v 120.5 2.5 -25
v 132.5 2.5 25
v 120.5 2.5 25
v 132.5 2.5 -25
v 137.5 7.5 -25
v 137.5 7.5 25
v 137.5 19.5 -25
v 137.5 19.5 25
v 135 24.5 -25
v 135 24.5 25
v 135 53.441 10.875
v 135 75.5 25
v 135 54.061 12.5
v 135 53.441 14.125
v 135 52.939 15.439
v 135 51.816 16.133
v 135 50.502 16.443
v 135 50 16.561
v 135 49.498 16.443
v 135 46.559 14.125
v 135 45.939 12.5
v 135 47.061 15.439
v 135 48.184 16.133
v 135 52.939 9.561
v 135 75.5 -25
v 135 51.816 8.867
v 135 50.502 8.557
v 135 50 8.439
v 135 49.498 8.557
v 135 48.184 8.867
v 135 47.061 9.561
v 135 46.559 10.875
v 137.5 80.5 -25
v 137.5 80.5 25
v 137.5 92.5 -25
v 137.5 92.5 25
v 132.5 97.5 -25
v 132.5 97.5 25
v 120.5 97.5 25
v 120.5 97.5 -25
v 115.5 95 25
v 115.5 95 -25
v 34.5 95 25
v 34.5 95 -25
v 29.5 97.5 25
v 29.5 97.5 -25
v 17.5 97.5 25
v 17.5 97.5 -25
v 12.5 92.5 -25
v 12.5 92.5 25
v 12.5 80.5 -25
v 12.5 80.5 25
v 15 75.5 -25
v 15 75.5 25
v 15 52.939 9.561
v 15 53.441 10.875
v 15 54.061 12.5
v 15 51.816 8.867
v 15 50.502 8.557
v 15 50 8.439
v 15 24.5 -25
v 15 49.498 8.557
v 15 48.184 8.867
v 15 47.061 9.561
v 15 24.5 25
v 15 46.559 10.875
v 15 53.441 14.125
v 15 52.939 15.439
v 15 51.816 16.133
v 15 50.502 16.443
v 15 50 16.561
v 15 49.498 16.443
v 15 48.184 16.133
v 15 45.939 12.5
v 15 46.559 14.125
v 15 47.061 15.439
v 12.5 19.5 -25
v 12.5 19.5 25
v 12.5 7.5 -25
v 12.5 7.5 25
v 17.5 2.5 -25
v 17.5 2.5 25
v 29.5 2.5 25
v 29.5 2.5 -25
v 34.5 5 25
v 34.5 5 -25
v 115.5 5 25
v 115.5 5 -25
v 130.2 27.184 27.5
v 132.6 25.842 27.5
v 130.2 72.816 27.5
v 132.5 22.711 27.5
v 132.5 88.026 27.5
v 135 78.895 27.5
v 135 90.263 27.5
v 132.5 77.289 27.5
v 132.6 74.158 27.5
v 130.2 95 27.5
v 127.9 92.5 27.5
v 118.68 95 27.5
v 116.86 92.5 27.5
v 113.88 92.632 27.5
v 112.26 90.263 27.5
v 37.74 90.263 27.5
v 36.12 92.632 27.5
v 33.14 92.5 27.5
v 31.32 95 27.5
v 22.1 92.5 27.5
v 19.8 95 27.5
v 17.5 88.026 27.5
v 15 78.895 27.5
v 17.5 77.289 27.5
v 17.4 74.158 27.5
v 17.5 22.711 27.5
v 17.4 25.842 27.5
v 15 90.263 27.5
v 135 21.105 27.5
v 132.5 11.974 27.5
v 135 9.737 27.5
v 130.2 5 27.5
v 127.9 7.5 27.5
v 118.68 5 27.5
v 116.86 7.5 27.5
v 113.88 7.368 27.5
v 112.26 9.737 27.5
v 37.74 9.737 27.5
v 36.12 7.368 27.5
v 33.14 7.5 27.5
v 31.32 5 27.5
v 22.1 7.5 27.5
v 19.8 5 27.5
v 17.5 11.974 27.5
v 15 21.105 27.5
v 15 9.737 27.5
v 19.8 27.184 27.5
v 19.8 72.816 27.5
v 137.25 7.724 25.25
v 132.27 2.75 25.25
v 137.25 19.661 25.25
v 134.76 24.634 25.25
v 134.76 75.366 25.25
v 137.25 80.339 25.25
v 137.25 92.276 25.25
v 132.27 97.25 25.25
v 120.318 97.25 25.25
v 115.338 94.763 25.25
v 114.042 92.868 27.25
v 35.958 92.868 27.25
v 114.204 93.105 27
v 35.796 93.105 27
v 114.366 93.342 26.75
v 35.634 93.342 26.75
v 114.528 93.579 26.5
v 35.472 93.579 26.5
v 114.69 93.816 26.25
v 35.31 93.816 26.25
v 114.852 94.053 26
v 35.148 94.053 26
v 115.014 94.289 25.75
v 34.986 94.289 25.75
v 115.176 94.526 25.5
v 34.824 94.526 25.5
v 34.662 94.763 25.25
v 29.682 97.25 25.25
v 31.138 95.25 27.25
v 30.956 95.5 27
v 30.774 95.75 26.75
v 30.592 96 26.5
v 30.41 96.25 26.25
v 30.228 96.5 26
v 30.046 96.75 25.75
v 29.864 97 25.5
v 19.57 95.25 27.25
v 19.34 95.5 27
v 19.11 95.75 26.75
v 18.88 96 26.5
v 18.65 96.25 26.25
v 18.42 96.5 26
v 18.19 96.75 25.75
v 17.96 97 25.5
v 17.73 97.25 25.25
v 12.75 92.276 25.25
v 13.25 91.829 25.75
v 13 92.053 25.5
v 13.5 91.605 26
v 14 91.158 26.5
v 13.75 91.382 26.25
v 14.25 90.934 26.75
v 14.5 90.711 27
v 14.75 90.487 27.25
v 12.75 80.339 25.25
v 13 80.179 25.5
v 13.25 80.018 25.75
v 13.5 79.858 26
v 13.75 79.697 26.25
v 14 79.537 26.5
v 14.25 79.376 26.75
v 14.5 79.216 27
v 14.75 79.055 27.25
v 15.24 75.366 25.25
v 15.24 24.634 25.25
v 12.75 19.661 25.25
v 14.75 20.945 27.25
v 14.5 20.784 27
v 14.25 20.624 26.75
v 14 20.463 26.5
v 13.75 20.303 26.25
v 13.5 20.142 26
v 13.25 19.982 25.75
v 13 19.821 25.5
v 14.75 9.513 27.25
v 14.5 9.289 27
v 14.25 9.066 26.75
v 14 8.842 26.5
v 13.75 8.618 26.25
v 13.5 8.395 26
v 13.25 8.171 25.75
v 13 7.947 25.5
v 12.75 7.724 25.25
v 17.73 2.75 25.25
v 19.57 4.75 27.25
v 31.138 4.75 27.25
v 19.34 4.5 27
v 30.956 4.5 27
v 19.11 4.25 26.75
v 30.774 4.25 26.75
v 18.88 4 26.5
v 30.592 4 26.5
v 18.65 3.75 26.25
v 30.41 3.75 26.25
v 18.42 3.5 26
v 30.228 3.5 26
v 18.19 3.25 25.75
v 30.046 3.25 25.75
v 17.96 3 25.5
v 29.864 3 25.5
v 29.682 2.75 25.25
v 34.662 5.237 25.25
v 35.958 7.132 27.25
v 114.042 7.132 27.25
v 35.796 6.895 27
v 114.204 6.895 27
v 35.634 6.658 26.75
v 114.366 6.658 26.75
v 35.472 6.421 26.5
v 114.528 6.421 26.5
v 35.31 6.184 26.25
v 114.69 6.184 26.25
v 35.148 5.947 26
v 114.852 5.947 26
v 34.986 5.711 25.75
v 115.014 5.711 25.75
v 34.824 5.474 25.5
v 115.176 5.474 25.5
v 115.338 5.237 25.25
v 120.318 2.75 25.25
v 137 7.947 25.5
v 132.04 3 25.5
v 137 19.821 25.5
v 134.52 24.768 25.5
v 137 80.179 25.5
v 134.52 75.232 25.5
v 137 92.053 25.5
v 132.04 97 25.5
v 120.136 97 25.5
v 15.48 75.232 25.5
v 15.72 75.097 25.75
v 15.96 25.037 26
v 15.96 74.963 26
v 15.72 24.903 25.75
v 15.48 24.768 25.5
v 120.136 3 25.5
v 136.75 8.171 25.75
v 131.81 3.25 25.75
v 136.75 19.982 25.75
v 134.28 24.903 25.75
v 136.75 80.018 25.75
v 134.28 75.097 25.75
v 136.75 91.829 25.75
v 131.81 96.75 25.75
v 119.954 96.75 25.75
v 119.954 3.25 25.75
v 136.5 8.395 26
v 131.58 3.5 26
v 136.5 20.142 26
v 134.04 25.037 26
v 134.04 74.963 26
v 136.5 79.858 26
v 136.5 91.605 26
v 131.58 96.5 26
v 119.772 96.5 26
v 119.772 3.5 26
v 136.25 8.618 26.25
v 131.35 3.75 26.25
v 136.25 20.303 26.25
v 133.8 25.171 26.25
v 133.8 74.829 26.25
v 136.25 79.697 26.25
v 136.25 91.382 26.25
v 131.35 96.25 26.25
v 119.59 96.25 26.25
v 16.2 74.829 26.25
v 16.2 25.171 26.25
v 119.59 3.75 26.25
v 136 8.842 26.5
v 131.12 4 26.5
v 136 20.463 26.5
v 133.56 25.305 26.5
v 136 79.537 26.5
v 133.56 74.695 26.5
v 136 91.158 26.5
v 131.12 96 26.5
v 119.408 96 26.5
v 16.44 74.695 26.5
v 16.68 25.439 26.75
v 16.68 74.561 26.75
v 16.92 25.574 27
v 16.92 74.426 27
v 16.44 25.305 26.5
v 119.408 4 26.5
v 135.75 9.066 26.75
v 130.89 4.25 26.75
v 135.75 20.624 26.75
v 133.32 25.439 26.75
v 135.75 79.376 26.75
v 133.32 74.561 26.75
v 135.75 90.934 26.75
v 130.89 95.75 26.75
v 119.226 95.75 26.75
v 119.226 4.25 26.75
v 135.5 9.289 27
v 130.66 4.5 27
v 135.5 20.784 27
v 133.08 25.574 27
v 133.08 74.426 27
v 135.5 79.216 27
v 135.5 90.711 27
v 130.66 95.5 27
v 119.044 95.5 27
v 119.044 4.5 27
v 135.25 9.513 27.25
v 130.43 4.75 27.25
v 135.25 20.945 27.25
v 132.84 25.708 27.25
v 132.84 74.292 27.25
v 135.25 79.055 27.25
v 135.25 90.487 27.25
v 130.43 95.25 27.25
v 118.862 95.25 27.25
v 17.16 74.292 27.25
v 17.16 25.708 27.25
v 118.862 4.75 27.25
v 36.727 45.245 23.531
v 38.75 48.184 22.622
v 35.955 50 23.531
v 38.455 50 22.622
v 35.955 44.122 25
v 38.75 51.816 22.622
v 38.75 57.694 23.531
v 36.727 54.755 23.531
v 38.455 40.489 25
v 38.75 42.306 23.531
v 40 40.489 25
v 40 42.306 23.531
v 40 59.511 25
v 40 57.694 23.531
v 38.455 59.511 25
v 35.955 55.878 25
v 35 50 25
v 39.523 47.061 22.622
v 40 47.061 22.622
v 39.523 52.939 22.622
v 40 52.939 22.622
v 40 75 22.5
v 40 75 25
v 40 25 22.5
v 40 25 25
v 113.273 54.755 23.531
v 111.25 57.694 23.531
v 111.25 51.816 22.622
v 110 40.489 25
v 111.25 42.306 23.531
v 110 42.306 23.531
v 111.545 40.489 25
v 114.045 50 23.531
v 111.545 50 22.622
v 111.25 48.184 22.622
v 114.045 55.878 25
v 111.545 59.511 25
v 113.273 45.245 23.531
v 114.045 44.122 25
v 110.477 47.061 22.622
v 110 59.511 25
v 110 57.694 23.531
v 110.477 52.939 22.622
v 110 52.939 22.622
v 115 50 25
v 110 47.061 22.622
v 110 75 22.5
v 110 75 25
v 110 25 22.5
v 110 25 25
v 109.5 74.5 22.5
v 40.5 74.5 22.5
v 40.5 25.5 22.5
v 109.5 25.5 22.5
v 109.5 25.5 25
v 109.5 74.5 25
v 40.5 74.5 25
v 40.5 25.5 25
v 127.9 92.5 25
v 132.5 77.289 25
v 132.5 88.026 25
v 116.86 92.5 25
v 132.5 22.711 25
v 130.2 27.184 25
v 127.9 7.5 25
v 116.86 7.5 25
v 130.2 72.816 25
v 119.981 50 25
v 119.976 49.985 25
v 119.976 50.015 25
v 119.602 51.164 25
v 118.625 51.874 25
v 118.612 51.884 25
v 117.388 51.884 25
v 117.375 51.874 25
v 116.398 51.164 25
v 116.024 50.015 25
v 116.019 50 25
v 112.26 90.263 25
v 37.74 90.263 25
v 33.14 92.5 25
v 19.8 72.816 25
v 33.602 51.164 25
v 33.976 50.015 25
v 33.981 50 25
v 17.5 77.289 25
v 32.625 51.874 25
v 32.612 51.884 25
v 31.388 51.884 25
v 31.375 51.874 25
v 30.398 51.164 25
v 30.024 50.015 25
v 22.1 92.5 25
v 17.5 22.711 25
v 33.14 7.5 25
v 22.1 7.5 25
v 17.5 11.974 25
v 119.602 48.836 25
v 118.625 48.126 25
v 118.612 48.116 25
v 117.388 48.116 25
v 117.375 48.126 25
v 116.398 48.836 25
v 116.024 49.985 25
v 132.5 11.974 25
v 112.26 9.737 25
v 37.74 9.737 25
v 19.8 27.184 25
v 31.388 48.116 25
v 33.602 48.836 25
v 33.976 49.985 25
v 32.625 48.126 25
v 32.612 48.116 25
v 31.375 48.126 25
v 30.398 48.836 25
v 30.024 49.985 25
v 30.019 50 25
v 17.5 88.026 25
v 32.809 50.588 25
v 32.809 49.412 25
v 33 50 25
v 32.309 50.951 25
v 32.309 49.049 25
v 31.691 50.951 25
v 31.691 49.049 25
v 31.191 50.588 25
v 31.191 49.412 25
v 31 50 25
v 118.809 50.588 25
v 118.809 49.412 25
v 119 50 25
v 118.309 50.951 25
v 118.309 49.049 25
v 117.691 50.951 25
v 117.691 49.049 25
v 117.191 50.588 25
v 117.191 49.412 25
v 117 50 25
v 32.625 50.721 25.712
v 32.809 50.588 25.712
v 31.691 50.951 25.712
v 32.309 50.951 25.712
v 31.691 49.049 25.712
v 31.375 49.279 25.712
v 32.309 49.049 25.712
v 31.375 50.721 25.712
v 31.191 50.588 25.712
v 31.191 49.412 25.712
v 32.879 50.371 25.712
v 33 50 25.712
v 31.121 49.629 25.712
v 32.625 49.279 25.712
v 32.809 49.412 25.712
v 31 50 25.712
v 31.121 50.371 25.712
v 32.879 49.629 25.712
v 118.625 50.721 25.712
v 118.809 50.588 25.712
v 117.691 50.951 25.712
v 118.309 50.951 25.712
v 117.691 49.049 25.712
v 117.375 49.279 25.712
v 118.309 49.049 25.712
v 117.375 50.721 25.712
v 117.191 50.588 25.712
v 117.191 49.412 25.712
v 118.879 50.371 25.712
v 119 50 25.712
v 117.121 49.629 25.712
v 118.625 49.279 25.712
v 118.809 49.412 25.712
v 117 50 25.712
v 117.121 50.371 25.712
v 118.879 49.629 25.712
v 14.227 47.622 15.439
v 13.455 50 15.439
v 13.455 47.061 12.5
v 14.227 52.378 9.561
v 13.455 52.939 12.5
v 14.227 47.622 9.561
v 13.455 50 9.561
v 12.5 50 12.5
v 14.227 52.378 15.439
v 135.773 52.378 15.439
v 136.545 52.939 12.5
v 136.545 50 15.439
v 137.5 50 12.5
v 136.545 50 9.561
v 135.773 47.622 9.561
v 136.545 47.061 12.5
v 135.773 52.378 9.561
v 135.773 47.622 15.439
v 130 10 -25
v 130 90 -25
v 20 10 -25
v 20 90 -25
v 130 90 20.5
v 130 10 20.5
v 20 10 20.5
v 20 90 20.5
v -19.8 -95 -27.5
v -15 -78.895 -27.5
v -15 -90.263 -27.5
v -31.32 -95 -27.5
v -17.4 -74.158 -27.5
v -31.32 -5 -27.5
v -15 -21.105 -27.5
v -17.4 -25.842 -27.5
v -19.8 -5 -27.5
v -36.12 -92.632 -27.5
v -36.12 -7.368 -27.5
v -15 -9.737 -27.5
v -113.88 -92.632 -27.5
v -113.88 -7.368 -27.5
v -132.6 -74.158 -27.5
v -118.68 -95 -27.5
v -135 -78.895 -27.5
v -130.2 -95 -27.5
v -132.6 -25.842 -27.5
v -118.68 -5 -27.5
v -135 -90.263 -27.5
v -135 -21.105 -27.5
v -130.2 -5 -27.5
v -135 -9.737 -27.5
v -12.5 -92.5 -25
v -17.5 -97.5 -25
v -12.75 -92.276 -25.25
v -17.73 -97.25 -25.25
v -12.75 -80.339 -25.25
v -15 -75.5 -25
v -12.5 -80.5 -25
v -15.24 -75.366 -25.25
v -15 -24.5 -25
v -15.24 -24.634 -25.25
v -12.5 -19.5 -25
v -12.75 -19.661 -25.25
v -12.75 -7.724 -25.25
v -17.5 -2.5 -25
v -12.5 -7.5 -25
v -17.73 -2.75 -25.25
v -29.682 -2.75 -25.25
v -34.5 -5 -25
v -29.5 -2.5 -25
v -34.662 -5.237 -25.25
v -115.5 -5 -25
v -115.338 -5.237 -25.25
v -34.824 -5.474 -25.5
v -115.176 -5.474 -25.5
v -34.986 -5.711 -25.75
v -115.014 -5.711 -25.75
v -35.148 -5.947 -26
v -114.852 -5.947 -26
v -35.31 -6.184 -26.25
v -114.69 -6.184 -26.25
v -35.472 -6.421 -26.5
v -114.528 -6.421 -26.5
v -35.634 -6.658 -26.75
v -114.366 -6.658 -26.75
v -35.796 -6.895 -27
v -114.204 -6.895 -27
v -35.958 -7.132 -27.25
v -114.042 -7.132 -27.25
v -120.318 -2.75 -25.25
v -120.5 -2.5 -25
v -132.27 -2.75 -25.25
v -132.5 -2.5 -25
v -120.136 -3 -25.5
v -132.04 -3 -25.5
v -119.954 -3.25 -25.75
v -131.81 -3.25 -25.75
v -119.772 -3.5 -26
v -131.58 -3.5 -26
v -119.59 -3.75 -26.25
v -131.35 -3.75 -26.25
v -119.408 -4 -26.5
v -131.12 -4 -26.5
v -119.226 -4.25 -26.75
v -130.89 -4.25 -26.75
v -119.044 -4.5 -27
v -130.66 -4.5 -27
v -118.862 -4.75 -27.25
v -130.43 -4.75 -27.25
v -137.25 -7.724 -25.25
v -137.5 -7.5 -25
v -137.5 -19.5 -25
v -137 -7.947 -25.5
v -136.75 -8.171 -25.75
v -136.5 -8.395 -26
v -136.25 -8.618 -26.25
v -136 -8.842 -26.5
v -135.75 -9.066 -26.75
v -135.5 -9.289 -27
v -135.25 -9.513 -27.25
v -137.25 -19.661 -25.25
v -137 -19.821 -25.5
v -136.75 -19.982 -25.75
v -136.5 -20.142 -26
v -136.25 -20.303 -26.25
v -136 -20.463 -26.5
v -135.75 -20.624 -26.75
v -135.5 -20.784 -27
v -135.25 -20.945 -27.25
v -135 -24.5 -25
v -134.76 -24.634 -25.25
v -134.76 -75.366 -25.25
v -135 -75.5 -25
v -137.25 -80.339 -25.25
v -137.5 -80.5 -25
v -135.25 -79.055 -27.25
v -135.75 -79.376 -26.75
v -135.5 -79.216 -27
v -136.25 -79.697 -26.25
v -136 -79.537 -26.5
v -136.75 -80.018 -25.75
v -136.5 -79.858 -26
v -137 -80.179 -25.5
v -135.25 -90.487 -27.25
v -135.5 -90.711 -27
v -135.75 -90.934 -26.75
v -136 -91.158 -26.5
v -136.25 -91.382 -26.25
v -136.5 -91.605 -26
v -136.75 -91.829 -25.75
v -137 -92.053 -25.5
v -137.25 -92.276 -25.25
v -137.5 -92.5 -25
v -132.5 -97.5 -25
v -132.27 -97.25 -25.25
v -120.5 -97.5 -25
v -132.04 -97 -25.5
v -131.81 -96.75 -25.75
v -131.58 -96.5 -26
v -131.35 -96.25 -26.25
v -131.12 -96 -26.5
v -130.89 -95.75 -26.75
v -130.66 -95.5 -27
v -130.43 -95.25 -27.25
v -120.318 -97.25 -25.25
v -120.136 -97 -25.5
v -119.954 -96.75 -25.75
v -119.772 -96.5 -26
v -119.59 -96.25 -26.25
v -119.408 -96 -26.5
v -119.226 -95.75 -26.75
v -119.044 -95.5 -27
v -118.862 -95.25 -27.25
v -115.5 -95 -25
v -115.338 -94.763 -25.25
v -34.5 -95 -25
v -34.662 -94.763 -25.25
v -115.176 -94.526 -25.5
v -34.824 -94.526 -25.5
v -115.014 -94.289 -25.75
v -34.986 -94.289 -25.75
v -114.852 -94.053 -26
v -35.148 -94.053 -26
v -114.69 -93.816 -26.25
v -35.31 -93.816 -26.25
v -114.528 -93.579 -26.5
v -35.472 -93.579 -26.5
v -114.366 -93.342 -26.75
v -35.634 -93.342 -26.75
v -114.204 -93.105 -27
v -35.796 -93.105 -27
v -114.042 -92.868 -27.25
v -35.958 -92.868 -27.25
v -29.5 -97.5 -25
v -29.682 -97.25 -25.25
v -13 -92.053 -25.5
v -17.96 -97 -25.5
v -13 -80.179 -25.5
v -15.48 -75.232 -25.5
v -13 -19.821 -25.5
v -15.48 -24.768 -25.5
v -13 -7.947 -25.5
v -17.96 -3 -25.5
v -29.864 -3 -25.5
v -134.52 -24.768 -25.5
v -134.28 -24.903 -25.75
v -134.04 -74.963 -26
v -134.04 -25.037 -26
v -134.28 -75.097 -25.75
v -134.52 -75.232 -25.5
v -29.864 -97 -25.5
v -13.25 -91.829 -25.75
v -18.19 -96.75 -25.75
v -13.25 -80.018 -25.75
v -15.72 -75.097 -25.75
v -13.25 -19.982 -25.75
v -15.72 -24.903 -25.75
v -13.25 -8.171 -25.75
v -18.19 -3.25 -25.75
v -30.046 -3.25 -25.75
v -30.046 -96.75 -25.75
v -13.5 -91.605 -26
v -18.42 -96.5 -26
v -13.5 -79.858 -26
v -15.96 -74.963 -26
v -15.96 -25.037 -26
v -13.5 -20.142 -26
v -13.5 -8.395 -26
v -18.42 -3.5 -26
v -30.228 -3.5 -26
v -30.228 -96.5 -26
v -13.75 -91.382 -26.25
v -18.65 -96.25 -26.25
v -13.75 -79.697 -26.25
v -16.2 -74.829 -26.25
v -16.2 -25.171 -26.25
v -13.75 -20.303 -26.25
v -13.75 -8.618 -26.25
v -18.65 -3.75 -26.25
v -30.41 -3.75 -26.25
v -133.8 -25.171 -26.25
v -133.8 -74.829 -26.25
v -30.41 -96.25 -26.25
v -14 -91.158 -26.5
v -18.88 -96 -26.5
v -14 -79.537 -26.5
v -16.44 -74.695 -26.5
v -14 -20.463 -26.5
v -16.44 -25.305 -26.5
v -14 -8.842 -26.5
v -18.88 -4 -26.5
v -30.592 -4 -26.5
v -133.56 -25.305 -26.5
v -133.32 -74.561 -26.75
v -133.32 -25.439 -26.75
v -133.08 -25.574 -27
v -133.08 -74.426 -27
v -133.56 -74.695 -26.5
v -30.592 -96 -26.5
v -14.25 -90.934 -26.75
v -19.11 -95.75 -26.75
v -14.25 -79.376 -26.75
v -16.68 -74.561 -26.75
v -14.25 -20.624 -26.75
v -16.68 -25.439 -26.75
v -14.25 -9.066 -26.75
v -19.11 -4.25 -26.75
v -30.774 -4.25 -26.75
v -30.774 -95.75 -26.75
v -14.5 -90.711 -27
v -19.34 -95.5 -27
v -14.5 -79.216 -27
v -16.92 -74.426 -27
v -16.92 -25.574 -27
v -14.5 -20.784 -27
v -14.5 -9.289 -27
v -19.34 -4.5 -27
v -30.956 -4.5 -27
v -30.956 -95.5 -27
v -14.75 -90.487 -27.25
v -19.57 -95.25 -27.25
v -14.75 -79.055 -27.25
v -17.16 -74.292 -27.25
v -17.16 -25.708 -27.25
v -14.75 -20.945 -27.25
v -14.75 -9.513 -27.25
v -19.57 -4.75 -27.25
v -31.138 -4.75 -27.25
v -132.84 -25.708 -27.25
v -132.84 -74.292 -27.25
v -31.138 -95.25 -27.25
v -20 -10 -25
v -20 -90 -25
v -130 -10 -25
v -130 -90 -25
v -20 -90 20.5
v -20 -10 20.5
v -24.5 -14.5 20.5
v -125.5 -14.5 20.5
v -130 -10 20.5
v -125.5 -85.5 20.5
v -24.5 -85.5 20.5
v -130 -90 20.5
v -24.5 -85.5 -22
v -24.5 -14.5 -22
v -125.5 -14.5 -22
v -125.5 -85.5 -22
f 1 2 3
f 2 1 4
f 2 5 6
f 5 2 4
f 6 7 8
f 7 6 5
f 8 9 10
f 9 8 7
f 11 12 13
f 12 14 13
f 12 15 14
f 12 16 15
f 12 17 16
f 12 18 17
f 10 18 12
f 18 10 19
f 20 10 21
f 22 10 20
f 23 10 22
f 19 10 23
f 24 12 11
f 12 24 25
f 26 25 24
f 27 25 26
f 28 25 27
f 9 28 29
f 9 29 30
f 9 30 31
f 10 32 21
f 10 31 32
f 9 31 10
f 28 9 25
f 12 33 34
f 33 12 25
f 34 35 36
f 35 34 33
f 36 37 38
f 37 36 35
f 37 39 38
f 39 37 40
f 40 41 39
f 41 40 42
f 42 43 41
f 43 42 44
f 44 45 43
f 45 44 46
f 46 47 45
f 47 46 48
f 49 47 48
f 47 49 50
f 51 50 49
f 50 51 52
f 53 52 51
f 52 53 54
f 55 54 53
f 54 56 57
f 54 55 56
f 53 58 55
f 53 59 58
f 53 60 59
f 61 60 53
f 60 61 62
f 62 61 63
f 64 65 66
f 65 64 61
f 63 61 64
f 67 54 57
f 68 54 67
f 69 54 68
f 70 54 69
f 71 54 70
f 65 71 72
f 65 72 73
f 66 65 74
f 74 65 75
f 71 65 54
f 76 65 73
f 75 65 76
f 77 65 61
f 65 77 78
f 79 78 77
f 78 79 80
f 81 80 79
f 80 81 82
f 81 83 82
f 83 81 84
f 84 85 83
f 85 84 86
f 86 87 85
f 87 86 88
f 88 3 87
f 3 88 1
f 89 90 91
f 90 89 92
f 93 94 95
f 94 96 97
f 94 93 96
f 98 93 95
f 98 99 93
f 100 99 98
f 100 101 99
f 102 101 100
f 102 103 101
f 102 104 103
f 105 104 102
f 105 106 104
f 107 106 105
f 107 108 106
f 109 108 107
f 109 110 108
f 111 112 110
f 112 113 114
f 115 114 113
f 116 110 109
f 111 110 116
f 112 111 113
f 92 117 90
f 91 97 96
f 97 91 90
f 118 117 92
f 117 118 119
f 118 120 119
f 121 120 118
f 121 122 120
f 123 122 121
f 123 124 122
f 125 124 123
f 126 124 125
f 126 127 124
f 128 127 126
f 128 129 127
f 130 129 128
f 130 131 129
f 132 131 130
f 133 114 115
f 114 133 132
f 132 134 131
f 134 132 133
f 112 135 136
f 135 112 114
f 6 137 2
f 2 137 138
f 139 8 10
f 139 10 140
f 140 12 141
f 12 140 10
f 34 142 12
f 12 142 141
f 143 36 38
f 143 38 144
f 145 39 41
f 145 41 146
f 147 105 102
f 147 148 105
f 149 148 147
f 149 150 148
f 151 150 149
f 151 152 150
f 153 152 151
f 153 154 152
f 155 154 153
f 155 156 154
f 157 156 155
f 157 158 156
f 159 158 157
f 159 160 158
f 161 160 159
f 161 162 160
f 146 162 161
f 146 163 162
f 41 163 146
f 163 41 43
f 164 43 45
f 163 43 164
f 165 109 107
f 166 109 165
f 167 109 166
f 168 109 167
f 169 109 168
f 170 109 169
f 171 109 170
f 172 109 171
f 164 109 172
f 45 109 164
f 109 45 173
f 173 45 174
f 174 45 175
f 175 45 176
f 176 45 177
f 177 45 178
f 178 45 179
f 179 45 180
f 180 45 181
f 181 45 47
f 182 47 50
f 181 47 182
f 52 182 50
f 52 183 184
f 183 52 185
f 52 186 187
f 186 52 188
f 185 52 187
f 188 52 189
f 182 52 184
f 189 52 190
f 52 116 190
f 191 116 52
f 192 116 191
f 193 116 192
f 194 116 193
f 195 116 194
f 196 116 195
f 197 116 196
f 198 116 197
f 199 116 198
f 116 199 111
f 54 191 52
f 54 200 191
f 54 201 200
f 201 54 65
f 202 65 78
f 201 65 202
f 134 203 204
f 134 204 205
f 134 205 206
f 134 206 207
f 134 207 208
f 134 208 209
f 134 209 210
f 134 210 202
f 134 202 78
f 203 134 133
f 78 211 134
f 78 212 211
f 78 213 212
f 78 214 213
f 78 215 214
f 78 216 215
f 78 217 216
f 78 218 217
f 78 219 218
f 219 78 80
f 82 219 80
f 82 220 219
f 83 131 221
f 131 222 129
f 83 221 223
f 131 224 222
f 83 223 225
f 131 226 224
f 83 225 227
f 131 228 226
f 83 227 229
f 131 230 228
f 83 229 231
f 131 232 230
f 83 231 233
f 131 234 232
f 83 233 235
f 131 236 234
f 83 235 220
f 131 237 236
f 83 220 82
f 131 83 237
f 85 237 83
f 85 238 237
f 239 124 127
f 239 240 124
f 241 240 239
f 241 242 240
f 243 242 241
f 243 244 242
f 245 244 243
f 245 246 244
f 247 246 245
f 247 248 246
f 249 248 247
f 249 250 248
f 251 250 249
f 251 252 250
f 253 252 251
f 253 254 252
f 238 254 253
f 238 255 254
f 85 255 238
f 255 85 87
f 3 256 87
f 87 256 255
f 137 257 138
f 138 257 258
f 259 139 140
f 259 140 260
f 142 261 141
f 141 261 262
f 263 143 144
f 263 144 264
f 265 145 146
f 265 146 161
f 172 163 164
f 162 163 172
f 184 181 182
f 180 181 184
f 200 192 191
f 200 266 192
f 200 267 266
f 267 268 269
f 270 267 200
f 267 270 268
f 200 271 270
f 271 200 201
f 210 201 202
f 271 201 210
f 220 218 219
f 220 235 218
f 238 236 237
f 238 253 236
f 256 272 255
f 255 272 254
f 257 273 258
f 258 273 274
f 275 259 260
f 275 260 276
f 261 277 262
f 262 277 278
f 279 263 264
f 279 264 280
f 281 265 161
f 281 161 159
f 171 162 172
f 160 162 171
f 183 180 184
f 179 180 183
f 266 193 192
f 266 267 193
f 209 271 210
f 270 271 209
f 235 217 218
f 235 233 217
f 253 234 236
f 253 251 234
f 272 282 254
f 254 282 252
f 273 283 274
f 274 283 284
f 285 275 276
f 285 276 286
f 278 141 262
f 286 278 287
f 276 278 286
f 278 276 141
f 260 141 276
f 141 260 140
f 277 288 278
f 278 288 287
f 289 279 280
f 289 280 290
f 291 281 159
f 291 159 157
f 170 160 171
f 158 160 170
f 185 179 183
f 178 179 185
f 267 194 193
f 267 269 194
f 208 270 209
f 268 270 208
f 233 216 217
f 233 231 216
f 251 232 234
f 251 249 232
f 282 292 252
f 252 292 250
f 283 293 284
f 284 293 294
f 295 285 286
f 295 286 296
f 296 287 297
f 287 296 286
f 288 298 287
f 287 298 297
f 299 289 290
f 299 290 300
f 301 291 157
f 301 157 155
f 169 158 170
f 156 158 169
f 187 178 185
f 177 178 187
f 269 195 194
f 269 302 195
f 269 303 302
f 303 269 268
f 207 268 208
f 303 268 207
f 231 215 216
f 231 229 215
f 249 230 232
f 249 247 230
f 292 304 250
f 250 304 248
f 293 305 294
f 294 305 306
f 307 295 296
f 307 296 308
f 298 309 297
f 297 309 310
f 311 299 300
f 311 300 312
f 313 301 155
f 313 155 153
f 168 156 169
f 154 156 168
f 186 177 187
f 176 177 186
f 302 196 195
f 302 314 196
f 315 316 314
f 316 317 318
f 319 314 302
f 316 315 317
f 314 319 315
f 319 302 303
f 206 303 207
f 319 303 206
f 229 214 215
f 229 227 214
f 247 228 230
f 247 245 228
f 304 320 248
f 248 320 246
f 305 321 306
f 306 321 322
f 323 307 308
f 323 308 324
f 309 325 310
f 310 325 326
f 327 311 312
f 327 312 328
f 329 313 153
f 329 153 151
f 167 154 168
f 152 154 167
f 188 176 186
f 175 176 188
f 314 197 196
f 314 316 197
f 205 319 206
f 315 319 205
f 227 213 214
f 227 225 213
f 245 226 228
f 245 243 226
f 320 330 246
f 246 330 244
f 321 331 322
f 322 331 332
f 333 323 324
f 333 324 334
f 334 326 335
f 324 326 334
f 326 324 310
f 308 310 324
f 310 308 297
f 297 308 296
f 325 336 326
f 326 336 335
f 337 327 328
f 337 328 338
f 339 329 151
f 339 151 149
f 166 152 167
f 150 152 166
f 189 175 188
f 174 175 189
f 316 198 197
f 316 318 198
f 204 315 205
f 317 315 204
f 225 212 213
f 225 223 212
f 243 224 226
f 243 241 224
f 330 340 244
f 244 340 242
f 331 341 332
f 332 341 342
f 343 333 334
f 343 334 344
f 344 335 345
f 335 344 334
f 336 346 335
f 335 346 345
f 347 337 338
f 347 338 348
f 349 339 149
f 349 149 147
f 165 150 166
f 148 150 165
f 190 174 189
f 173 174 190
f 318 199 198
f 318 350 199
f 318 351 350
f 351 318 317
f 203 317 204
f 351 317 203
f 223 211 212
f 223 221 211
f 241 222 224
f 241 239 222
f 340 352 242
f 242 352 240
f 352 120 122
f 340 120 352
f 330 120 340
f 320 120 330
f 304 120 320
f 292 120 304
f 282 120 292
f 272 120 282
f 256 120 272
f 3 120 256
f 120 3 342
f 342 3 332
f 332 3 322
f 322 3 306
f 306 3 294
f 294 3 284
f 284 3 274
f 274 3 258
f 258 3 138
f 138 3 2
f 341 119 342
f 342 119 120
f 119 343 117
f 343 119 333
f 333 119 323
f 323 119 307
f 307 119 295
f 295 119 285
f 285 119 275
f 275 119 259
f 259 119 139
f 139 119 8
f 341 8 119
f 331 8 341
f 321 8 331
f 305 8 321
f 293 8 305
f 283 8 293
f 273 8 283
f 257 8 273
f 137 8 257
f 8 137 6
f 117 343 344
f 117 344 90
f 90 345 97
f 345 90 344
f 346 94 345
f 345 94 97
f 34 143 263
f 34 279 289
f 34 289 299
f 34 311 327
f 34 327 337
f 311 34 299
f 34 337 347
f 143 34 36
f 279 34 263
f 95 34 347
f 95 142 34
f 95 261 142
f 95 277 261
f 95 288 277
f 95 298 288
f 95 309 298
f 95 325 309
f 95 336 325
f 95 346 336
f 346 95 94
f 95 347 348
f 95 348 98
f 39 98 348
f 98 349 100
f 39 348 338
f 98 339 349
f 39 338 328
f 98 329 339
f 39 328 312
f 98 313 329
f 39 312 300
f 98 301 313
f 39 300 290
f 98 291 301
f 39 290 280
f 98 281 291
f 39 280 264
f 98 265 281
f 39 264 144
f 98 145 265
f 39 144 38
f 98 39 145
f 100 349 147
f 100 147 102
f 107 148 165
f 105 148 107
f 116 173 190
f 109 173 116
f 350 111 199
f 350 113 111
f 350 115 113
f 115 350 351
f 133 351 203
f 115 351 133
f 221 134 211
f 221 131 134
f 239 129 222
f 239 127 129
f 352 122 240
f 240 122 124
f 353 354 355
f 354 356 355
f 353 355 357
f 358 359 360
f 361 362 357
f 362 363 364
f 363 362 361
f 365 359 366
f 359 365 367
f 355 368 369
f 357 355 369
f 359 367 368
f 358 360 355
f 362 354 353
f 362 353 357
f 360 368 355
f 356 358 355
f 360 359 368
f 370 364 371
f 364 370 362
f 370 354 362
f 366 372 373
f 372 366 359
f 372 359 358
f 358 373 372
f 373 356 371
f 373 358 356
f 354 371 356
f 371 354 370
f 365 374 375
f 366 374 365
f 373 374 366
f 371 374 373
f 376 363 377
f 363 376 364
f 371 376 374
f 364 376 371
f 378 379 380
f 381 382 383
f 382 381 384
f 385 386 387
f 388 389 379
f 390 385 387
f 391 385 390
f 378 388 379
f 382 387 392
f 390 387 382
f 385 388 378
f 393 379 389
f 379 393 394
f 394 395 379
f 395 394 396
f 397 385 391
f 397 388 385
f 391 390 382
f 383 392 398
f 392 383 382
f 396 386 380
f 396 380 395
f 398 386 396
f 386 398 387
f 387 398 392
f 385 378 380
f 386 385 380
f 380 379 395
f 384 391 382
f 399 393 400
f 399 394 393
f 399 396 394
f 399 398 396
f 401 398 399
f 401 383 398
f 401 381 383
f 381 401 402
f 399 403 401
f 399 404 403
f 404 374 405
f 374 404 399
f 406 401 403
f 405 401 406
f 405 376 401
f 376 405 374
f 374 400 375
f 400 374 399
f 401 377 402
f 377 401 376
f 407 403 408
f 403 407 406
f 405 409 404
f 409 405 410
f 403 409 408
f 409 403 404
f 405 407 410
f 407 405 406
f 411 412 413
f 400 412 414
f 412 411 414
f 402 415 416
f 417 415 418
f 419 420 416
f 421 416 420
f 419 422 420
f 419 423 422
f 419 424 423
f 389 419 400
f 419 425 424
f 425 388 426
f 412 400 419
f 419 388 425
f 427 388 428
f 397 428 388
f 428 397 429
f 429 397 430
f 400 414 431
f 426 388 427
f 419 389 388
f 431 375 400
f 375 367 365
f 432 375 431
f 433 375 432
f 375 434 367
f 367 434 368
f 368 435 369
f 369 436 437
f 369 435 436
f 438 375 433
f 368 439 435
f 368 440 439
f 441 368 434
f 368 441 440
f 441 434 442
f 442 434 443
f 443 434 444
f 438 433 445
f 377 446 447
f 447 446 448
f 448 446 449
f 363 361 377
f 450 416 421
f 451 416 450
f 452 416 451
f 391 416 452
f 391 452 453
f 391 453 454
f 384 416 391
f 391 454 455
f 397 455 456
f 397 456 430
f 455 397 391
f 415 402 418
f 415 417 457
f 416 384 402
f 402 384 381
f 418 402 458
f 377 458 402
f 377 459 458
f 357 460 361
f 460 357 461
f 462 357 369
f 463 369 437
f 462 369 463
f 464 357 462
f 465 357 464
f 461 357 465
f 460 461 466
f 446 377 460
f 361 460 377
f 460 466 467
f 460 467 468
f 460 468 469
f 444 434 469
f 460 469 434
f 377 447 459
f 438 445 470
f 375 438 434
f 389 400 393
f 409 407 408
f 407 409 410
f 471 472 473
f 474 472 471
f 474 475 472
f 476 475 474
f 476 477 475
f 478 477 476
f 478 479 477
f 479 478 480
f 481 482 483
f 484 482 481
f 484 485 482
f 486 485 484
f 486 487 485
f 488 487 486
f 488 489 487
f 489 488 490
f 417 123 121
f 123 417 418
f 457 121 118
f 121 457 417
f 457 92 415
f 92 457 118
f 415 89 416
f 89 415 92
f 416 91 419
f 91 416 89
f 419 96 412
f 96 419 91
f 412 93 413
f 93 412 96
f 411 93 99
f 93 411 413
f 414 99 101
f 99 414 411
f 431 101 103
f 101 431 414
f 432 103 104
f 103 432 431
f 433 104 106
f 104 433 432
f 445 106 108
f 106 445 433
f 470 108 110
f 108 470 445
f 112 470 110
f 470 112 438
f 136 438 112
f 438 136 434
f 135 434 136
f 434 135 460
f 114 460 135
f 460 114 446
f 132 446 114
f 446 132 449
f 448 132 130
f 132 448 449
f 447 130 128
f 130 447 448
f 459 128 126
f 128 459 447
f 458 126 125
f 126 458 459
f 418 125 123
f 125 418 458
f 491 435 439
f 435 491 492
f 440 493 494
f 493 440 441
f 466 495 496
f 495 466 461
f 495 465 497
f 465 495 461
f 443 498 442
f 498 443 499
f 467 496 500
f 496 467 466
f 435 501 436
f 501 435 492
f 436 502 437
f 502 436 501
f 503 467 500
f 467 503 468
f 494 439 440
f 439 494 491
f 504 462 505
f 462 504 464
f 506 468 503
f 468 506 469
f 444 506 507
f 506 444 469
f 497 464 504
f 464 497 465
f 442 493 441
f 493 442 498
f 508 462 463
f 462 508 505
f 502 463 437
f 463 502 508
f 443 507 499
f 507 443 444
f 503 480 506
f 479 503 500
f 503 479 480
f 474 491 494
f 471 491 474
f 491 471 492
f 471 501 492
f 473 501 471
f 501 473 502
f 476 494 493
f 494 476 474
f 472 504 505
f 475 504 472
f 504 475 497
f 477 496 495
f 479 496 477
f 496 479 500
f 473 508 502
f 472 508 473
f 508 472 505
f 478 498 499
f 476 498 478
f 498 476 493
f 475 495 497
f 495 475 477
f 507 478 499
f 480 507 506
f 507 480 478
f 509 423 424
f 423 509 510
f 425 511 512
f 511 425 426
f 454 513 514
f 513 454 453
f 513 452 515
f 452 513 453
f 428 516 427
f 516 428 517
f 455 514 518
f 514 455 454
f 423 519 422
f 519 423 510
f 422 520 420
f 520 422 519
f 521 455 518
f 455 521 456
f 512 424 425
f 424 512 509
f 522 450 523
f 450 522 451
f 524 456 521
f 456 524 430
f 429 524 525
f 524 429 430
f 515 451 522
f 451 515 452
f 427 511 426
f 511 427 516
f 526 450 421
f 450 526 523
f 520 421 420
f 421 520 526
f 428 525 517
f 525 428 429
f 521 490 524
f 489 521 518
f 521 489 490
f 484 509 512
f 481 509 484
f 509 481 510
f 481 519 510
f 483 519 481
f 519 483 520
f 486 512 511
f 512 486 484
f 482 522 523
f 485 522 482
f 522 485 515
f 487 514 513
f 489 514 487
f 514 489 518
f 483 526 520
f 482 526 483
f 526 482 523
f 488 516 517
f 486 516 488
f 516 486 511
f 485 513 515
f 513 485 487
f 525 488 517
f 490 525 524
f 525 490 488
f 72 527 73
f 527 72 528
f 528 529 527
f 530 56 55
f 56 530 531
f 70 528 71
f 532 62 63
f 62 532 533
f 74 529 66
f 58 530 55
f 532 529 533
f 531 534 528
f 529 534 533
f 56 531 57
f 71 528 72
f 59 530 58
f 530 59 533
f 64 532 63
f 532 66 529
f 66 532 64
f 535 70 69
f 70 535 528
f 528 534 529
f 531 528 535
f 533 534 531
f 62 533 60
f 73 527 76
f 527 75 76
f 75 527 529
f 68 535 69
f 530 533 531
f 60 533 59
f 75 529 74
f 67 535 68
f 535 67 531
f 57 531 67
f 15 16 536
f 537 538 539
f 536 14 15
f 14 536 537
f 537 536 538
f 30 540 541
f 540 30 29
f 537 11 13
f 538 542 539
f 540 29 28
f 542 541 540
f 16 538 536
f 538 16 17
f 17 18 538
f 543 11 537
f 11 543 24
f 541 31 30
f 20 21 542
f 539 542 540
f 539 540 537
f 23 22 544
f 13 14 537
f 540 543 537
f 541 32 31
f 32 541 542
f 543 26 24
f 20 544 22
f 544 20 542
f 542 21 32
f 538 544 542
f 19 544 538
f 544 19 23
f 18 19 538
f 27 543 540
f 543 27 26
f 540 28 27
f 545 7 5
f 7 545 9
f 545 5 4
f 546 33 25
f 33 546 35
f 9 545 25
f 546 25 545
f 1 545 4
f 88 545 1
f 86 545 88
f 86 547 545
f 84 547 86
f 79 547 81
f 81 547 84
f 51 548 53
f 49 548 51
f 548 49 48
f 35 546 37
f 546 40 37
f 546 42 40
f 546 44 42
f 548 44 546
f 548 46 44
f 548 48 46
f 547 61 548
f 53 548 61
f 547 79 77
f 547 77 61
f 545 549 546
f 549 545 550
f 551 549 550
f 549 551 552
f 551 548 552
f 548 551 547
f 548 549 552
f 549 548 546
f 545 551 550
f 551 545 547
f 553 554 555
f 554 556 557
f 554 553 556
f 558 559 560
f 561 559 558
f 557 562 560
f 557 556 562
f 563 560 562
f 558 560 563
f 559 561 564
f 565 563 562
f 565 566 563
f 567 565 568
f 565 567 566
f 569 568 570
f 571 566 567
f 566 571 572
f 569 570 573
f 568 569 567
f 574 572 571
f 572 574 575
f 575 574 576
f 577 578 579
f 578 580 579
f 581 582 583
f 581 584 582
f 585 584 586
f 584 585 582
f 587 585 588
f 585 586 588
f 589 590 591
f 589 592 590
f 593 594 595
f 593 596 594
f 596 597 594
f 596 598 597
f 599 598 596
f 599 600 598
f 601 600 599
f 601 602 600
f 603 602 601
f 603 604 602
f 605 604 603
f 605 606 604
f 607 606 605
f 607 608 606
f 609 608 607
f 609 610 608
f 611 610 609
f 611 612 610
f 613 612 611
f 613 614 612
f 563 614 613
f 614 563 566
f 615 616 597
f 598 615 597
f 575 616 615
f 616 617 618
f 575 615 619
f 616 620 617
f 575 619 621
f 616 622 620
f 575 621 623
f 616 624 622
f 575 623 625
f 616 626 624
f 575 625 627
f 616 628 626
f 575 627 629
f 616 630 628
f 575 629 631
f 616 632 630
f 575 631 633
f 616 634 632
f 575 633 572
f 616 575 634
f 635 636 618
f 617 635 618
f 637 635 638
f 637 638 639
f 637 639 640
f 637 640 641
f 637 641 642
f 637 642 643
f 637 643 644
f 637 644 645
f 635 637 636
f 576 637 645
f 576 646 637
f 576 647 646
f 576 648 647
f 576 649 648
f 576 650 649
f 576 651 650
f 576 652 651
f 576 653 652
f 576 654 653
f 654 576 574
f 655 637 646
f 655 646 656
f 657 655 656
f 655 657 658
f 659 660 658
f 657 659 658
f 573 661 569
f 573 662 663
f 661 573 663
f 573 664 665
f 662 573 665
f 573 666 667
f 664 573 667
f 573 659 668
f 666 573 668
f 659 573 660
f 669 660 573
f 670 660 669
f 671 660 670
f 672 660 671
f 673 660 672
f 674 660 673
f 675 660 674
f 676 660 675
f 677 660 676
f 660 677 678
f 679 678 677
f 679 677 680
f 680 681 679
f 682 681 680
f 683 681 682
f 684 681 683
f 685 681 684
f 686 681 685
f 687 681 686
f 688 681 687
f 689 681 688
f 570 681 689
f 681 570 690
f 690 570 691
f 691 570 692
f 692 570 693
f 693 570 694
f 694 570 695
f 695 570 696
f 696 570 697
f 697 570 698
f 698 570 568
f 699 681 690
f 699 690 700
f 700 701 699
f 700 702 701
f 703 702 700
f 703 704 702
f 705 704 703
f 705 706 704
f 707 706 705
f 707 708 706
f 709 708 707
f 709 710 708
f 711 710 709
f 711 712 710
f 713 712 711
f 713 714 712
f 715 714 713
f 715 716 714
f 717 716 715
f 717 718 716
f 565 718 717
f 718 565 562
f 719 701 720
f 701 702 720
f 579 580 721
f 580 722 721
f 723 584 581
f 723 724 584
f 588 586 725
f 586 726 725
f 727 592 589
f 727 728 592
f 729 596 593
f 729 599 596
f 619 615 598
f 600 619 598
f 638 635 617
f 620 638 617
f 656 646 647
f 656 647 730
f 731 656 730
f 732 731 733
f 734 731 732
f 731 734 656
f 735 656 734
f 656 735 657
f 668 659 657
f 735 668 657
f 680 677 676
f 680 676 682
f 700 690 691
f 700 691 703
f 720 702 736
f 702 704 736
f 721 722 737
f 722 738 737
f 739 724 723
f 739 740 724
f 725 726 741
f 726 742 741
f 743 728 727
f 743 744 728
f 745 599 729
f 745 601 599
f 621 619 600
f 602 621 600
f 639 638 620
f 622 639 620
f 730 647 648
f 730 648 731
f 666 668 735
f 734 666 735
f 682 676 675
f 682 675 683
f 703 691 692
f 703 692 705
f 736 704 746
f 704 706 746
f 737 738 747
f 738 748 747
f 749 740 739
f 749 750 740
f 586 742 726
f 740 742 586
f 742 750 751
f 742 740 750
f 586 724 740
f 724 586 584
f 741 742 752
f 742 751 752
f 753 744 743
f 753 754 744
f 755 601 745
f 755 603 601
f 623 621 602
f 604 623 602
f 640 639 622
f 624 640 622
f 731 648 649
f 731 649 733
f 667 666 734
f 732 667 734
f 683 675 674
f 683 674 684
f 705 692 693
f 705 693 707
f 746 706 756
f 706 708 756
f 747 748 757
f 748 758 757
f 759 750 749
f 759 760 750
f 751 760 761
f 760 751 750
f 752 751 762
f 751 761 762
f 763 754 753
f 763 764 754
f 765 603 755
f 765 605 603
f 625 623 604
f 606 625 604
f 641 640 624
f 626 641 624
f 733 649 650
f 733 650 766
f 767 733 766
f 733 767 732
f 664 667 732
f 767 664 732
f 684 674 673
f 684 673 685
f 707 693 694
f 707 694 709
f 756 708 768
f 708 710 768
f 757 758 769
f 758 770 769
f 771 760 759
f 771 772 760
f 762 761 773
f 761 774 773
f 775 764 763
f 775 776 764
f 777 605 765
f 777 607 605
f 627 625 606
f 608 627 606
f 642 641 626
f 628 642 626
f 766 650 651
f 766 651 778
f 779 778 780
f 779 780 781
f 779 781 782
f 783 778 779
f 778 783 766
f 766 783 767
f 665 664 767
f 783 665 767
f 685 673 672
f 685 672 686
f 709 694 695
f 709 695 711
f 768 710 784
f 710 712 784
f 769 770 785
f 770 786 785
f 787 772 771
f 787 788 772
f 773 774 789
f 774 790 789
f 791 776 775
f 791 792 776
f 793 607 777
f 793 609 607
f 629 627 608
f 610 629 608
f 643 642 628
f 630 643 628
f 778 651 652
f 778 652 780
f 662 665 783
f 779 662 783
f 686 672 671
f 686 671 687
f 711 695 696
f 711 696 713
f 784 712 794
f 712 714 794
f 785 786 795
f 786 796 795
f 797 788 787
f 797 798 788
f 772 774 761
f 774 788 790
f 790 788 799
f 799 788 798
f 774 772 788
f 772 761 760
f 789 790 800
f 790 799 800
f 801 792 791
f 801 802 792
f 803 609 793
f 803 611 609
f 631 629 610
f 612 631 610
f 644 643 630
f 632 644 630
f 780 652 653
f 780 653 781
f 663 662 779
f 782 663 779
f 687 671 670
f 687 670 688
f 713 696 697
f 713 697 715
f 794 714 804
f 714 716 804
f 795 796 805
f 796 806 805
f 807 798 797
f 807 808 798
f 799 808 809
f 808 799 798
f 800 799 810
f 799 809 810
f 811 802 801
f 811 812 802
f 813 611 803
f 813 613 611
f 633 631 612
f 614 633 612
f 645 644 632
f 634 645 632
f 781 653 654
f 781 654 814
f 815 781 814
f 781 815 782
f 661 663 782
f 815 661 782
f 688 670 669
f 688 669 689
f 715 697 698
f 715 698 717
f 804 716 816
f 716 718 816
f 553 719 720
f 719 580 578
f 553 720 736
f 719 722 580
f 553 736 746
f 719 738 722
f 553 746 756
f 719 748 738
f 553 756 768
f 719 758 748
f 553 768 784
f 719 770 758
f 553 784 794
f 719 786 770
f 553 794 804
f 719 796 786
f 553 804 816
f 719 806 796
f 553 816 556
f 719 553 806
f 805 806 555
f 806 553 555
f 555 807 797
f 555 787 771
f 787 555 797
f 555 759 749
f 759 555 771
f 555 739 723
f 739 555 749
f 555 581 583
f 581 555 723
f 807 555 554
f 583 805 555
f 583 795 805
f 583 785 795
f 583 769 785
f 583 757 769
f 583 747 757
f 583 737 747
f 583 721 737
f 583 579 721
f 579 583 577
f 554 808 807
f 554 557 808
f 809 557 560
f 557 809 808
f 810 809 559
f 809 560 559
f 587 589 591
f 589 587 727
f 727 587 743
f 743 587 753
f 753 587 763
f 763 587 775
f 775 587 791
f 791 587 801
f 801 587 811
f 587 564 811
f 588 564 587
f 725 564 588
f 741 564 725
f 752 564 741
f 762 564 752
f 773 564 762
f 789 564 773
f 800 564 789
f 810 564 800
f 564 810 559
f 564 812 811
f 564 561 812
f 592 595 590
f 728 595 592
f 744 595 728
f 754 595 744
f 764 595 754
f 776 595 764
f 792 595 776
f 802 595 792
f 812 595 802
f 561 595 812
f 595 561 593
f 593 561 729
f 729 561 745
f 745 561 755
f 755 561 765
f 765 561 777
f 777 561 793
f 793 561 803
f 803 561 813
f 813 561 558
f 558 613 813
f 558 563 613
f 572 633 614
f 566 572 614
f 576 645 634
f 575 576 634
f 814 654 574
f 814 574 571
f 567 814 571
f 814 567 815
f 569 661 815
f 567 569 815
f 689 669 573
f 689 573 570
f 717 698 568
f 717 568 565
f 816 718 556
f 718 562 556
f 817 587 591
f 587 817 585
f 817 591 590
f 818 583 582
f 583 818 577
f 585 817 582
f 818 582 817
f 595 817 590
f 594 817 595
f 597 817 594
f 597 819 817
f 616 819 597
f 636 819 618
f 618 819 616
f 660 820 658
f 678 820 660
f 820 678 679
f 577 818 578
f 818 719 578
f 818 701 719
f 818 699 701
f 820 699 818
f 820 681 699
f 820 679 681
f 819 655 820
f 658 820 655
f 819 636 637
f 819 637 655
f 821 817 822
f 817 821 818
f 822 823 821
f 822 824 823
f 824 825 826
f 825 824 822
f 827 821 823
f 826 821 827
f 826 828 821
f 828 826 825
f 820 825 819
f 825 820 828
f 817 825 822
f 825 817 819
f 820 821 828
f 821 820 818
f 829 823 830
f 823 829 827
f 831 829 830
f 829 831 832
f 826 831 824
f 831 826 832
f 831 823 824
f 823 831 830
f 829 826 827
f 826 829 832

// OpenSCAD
// Globals :(
polyMaxX = 62.5;
polyMaxY = 47.5;
halfBoxHeight = 25;
bezelHeight = 2.5;

module batteryPoly() {

// Update polyMaxX and polyMaxY if these points change
points = [
    [2.5, 22],
    [0, 17],
    [0, 5],
    [5, 0],
    [17, 0],
    [22, 2.5],
    [62.5, 2.5],
    [62.5, 47.5],
    [2.5, 47.5]
];

newpoints = [for (i=points) i-[polyMaxX, polyMaxY]];
paths = [
    [0,1,2,3,4,5,6,7,8]
];

union(){
//Bottom Left
polygon(points=newpoints, paths=paths);

//Bottom Right
rotate([0,180,0])
polygon(points=newpoints, paths=paths);

//Top Left
rotate([180,0,0])
polygon(points=newpoints, paths=paths);

//Top Right
rotate([180,180,0])
polygon(points=newpoints, paths=paths);
}
}

module batteryHalfPack(){
    
union(){
linear_extrude(height=halfBoxHeight){
batteryPoly();
}

// Make the width and height of the bevel equal
bezelWidth = bezelHeight;

// This produces an even bevel all around the perimeter
bezelScale = [ 1-(bezelWidth/polyMaxX),
               1-(bezelWidth/polyMaxY)];

translate([0,0,halfBoxHeight])
linear_extrude( height=bezelHeight, 
                scale=bezelScale){
    batteryPoly();
}
}
}

module batteryPack() {

// I want the inset to be smaller than the bezel so there will be a flat top to strengthen it. I accomplish this by tweaking the scale to make the inset uniformly smaller than the bezel.
insetWidth = 2.5+bezelHeight;    
insetToolScale = [1-(insetWidth/polyMaxX),
                  1-(insetWidth/polyMaxY),
                  1];

// This scales a sphere to make indentations on either side of a faux access panel.  These dimensions are independent of any others, even if they have the same values.
divotToolScale = [5,10,2.5];

// DEBUG: comment this and set $fa, $fs for STL render
$fn = 10;
    
// PROD: comment this and set $fn for preview
//$fa = 2; $fs = 0.2;

union(){

difference(){
    
    union(){
        batteryHalfPack();
        mirror([0,0,1]) batteryHalfPack();
    }
    
    // Top inset cutting tool
    translate([0,0,halfBoxHeight])
    scale(insetToolScale)
    linear_extrude( height=3 ) batteryPoly();
    
    // Left divot cutting tool
    difference(){
        translate([-35, 0, halfBoxHeight])
        scale(divotToolScale)
        sphere(r=1);
        
        translate([-35, -10, halfBoxHeight-2.5])
        cube(2*divotToolScale);
    }   
    
    // Right divot cutting tool
    difference(){
        translate([35, 0, halfBoxHeight])
        scale(divotToolScale)
        sphere(r=1);
        
        translate([25, -10, halfBoxHeight-2.5])
        cube(2*divotToolScale);
    }
    
    // Top battery panel cutting tool
    difference(){
        translate([-35, -25, halfBoxHeight-2.5])
        cube([70, 50, 3]);
        
        translate([-34.5, -24.5, halfBoxHeight-2.5])
        cube([69, 49, 3]);
    }
} //difference

// Additive decorations follow

// Left side knob
translate([-(polyMaxX-5), 0, halfBoxHeight-12.5])
sphere(r=5);

// Right side knob
translate([(polyMaxX-5), 0, halfBoxHeight-12.5])
sphere(r=5);

//Left top knob
translate([-43, 0, halfBoxHeight-1.5])
difference(){
    sphere(r=2.5);
    cylinder(r=1, h=2.5);
}

//Right top knob
translate([43, 0, halfBoxHeight-1.5])
difference(){
    sphere(r=2.5);
    cylinder(r=1, h=2.5);
}

} //union

} //module batteryPack

// Make two battery packs, a top and a bottom.
// Make the top first, then use it as a tool to shape the bottom.

module boxTop() {
difference() {
    batteryPack();
    
    // DEBUG: Cut away half the cube so I can see where the holes go
    *translate([0,-polyMaxY-0.5,-(halfBoxHeight+bezelHeight)-0.5])
    cube([polyMaxX+1, 
          2*polyMaxY+1, 
          2*(halfBoxHeight+bezelHeight)+1]);
    
    // Cut off the bottom where the top will stop, probably at the beginning of the bezel or just before
    translate([0, 0,-(halfBoxHeight+bezelHeight/2+1/2)])
    cube([(2*polyMaxX)+10, 
          (2*polyMaxY)+10, 
          bezelHeight+1],
          center=true);

    // Cut the hole into the top that makes this a box
    translate([0,0,-3])
    cube([2*(polyMaxX-7.5), 
          2*(polyMaxY-7.5), 
          (2*halfBoxHeight)-3], 
          center=true);
}
}

module boxBottom() {
difference() {
    batteryPack();
    
    // Cut away the lid, leaving the inner box
    // This leaves an infintesimal shell in preview, ugh
    boxTop();
    
    // DEBUG: Cut away half the cube so I can see where the holes go
    *translate([0,-polyMaxY-0.5,-(halfBoxHeight+bezelHeight)-0.5])
    cube([polyMaxX+1, 
          2*polyMaxY+1, 
          2*(halfBoxHeight+bezelHeight)+1]);
    
    
    // Cut the hole into the bottom that makes this a box
    translate([0,0,3])
    cube([2*(polyMaxX-12), 
          2*(polyMaxY-12), 
          (2*halfBoxHeight)], 
          center=true);
}
}

translate([75, 50, 0])
boxTop();

translate([-75, -50, 0])
boxBottom();
